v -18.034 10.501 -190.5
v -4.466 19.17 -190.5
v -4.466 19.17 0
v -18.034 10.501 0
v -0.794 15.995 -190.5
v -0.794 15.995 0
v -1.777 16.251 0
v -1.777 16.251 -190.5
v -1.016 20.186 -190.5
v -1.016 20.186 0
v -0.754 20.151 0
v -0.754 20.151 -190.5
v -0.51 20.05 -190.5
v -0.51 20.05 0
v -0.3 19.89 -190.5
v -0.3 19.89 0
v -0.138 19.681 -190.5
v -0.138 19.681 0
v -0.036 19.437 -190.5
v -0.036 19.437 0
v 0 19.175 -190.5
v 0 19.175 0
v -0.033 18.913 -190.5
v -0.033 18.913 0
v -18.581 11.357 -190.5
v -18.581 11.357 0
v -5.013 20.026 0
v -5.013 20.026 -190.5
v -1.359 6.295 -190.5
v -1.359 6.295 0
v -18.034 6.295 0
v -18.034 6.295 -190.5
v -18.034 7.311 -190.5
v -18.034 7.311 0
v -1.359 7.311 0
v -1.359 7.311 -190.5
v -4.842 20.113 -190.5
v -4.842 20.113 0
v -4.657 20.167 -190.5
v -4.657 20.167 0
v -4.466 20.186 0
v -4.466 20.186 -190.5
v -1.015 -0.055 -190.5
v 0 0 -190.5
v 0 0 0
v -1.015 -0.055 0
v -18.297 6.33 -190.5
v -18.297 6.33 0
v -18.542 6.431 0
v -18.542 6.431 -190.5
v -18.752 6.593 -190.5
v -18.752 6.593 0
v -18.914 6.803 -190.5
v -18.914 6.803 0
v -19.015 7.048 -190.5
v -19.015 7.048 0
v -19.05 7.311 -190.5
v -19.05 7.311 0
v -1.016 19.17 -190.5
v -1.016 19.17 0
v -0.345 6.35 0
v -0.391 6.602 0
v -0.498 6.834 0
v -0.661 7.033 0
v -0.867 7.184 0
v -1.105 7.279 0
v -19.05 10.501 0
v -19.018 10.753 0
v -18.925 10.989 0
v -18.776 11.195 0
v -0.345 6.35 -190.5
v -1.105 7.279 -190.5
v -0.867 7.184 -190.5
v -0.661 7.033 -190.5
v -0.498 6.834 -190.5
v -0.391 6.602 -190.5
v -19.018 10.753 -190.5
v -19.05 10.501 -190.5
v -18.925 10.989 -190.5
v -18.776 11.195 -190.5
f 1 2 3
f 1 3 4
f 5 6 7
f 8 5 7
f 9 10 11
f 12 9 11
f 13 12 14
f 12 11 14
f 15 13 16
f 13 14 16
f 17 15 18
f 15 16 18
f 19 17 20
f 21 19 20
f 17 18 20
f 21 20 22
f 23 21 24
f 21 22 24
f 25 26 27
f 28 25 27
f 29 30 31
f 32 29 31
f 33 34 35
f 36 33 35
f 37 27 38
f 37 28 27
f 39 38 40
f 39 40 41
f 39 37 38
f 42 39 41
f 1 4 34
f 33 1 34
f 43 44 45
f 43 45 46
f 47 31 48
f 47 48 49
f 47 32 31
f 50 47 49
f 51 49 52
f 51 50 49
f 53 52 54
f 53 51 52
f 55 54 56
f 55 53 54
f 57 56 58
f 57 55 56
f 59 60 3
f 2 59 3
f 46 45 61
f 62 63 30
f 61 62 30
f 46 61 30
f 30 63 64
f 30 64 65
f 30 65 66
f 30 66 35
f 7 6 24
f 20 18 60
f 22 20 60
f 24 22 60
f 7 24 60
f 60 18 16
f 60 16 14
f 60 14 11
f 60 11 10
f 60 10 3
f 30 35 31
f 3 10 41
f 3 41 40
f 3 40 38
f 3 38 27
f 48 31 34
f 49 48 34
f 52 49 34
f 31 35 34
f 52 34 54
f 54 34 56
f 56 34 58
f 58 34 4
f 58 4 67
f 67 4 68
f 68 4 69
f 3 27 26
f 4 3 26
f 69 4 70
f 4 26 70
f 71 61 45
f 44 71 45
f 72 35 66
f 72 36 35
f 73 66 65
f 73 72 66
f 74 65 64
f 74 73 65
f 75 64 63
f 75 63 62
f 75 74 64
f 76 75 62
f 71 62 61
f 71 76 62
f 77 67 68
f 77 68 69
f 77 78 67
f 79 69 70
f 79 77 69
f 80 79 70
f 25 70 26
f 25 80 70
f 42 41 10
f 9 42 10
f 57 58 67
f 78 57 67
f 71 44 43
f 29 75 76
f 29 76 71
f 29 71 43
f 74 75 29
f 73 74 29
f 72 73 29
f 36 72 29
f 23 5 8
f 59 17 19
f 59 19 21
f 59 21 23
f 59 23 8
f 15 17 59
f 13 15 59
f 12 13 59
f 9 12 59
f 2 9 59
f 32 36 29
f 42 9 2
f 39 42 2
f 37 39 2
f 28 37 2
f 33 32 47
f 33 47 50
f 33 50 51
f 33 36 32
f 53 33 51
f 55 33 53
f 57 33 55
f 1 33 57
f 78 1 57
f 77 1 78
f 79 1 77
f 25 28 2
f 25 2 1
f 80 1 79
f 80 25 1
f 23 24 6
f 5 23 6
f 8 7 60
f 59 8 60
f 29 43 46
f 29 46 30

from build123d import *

# Parameters (mm, degrees)
BOSS_EXTRUDE1_DEPTH = 190.5
FILLET1_R           = 1.016


with BuildPart() as part:
    # Sketch1 → Boss-Extrude1 (new body)
    with BuildSketch(Plane.XY):
        with BuildLine():
            Line((-1.014506285, -0.055072655), (-1.359217172, 6.294927345))
            Line((-1.359217172, 6.294927345), (-19.05, 6.294927345))
            Line((-19.05, 6.294927345), (-19.05, 11.057427345))
            Line((-19.05, 11.057427345), (-4.7625, 20.185552345))
            Line((-4.7625, 20.185552345), (-1.016, 20.185552345))
            ThreePointArc((-1.016, 20.185552345), (-0.212054439, 19.790783006), (-0.032858991, 18.913252215))
            Line((-0.032858991, 18.913252215), (-0.79375, 15.994552345))
            Line((-0.79375, 15.994552345), (-1.776891009, 16.250852474))
            Line((-1.776891009, 16.250852474), (-1.016, 19.169552345))
            Line((-1.016, 19.169552345), (-4.465650477, 19.169552345))
            Line((-4.465650477, 19.169552345), (-18.034, 10.500884594))
            Line((-18.034, 10.500884594), (-18.034, 7.310927345))
            Line((-18.034, 7.310927345), (-0.396875, 7.310927345))
            Line((-0.396875, 7.310927345), (0, 0))
            Line((0, 0), (-1.014506285, -0.055072655))
        make_face()
    extrude(amount=-BOSS_EXTRUDE1_DEPTH)

    # Fillet1
    fillet1_edges = [part.edges().sort_by_distance(p)[0] for p in [
        (-19.05, 6.294927345, -95.25),
        (-19.05, 11.057427345, -95.25),
        (-4.7625, 20.185552345, -95.25),
        (-0.396875, 7.310927345, -95.25),
    ]]
    fillet(fillet1_edges, radius=FILLET1_R)


solid = part.part
